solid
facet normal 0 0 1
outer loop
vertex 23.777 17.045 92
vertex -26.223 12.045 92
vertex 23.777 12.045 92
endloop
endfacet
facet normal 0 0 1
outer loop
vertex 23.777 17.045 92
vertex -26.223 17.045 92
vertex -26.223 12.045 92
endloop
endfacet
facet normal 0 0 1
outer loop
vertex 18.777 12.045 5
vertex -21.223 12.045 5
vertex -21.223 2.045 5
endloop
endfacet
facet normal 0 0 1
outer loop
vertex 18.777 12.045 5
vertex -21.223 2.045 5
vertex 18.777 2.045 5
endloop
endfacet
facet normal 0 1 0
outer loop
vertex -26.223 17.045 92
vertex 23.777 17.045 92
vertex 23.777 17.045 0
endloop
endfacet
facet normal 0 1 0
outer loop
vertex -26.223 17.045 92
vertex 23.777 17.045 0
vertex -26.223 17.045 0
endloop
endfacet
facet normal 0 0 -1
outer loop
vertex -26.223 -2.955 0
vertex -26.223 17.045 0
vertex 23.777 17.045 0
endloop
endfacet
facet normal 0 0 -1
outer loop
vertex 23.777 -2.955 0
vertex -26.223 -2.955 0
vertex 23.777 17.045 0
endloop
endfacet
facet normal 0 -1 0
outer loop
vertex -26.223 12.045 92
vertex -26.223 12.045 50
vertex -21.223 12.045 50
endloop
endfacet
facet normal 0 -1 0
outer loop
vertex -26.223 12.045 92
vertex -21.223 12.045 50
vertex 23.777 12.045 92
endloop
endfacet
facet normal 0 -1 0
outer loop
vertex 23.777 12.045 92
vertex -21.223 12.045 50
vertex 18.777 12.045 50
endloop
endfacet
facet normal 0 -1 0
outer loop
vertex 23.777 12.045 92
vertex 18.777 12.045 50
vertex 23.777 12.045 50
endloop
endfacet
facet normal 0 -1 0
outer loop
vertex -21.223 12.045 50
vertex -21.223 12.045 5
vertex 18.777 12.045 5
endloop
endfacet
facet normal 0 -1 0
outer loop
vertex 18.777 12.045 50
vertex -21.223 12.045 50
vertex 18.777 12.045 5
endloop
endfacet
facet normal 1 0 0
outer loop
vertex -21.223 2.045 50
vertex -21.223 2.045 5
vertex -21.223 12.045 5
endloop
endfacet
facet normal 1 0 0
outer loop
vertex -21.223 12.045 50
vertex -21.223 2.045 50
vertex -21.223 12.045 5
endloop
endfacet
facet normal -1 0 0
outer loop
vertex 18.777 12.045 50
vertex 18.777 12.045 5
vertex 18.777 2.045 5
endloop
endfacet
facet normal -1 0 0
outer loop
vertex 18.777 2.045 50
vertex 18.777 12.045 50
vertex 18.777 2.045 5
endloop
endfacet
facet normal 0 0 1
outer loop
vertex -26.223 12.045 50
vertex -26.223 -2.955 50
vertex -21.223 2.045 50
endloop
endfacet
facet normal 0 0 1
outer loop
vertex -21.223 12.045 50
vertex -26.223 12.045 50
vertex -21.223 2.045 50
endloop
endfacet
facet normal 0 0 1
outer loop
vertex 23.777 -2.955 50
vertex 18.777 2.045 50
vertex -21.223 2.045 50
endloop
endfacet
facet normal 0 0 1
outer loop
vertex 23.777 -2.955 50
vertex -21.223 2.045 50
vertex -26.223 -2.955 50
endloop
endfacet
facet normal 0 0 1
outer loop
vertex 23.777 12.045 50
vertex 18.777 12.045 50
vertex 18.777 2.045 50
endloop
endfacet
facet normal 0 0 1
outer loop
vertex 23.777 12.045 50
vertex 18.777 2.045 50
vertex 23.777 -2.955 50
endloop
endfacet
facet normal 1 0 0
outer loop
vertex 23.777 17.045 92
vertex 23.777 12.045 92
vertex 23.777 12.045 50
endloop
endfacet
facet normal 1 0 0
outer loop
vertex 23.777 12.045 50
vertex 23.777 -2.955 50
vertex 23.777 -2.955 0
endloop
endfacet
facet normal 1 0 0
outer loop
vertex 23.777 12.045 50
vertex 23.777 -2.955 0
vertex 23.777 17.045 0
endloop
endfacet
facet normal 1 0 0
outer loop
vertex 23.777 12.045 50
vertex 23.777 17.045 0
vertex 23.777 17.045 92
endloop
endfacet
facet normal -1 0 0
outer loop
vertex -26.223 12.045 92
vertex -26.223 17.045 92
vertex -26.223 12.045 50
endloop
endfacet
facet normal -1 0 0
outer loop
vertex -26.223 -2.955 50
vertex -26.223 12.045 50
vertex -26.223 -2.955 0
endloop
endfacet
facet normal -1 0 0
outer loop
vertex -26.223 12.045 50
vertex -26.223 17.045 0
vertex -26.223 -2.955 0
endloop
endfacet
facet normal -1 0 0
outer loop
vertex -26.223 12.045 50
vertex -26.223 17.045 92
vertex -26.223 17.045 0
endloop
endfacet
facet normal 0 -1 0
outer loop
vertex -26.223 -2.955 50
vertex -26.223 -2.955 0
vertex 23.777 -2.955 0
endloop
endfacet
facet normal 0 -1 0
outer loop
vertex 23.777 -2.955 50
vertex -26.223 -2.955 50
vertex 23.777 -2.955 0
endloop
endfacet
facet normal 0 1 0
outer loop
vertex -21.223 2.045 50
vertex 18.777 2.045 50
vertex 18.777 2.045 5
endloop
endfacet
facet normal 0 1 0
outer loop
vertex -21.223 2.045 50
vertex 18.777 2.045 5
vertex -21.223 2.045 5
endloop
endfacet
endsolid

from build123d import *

# Parameters (mm, degrees)
F0_W     = 40
F0_H     = 10
F1_DEPTH = 5
F2_DEPTH = 92
F3_DEPTH = 50


with BuildPart() as f1:
    # F0 (on Top) → F1 (new body)
    with BuildSketch(Plane.XY):
        with Locations((-1.222661, 7.045219)):
            Rectangle(F0_W, F0_H)
    extrude(amount=F1_DEPTH)

    # F0 (on Top) → F2 (join)
    with BuildSketch(Plane.XY):
        Polygon((-26.222661, 12.045219), (-21.222661, 12.045219), (18.777339, 12.045219), (23.777339, 12.045219), (23.777339, 17.045219), (-26.222661, 17.045219), align=None)
    extrude(amount=F2_DEPTH)

    # F0 (on Top) → F3 (join)
    with BuildSketch(Plane.XY):
        Polygon((-21.222661, 2.045219), (-21.222661, 12.045219), (-26.222661, 12.045219), (-26.222661, -2.954781), (23.777339, -2.954781), (23.777339, 12.045219), (18.777339, 12.045219), (18.777339, 2.045219), align=None)
    extrude(amount=F3_DEPTH)


solid = f1.part
